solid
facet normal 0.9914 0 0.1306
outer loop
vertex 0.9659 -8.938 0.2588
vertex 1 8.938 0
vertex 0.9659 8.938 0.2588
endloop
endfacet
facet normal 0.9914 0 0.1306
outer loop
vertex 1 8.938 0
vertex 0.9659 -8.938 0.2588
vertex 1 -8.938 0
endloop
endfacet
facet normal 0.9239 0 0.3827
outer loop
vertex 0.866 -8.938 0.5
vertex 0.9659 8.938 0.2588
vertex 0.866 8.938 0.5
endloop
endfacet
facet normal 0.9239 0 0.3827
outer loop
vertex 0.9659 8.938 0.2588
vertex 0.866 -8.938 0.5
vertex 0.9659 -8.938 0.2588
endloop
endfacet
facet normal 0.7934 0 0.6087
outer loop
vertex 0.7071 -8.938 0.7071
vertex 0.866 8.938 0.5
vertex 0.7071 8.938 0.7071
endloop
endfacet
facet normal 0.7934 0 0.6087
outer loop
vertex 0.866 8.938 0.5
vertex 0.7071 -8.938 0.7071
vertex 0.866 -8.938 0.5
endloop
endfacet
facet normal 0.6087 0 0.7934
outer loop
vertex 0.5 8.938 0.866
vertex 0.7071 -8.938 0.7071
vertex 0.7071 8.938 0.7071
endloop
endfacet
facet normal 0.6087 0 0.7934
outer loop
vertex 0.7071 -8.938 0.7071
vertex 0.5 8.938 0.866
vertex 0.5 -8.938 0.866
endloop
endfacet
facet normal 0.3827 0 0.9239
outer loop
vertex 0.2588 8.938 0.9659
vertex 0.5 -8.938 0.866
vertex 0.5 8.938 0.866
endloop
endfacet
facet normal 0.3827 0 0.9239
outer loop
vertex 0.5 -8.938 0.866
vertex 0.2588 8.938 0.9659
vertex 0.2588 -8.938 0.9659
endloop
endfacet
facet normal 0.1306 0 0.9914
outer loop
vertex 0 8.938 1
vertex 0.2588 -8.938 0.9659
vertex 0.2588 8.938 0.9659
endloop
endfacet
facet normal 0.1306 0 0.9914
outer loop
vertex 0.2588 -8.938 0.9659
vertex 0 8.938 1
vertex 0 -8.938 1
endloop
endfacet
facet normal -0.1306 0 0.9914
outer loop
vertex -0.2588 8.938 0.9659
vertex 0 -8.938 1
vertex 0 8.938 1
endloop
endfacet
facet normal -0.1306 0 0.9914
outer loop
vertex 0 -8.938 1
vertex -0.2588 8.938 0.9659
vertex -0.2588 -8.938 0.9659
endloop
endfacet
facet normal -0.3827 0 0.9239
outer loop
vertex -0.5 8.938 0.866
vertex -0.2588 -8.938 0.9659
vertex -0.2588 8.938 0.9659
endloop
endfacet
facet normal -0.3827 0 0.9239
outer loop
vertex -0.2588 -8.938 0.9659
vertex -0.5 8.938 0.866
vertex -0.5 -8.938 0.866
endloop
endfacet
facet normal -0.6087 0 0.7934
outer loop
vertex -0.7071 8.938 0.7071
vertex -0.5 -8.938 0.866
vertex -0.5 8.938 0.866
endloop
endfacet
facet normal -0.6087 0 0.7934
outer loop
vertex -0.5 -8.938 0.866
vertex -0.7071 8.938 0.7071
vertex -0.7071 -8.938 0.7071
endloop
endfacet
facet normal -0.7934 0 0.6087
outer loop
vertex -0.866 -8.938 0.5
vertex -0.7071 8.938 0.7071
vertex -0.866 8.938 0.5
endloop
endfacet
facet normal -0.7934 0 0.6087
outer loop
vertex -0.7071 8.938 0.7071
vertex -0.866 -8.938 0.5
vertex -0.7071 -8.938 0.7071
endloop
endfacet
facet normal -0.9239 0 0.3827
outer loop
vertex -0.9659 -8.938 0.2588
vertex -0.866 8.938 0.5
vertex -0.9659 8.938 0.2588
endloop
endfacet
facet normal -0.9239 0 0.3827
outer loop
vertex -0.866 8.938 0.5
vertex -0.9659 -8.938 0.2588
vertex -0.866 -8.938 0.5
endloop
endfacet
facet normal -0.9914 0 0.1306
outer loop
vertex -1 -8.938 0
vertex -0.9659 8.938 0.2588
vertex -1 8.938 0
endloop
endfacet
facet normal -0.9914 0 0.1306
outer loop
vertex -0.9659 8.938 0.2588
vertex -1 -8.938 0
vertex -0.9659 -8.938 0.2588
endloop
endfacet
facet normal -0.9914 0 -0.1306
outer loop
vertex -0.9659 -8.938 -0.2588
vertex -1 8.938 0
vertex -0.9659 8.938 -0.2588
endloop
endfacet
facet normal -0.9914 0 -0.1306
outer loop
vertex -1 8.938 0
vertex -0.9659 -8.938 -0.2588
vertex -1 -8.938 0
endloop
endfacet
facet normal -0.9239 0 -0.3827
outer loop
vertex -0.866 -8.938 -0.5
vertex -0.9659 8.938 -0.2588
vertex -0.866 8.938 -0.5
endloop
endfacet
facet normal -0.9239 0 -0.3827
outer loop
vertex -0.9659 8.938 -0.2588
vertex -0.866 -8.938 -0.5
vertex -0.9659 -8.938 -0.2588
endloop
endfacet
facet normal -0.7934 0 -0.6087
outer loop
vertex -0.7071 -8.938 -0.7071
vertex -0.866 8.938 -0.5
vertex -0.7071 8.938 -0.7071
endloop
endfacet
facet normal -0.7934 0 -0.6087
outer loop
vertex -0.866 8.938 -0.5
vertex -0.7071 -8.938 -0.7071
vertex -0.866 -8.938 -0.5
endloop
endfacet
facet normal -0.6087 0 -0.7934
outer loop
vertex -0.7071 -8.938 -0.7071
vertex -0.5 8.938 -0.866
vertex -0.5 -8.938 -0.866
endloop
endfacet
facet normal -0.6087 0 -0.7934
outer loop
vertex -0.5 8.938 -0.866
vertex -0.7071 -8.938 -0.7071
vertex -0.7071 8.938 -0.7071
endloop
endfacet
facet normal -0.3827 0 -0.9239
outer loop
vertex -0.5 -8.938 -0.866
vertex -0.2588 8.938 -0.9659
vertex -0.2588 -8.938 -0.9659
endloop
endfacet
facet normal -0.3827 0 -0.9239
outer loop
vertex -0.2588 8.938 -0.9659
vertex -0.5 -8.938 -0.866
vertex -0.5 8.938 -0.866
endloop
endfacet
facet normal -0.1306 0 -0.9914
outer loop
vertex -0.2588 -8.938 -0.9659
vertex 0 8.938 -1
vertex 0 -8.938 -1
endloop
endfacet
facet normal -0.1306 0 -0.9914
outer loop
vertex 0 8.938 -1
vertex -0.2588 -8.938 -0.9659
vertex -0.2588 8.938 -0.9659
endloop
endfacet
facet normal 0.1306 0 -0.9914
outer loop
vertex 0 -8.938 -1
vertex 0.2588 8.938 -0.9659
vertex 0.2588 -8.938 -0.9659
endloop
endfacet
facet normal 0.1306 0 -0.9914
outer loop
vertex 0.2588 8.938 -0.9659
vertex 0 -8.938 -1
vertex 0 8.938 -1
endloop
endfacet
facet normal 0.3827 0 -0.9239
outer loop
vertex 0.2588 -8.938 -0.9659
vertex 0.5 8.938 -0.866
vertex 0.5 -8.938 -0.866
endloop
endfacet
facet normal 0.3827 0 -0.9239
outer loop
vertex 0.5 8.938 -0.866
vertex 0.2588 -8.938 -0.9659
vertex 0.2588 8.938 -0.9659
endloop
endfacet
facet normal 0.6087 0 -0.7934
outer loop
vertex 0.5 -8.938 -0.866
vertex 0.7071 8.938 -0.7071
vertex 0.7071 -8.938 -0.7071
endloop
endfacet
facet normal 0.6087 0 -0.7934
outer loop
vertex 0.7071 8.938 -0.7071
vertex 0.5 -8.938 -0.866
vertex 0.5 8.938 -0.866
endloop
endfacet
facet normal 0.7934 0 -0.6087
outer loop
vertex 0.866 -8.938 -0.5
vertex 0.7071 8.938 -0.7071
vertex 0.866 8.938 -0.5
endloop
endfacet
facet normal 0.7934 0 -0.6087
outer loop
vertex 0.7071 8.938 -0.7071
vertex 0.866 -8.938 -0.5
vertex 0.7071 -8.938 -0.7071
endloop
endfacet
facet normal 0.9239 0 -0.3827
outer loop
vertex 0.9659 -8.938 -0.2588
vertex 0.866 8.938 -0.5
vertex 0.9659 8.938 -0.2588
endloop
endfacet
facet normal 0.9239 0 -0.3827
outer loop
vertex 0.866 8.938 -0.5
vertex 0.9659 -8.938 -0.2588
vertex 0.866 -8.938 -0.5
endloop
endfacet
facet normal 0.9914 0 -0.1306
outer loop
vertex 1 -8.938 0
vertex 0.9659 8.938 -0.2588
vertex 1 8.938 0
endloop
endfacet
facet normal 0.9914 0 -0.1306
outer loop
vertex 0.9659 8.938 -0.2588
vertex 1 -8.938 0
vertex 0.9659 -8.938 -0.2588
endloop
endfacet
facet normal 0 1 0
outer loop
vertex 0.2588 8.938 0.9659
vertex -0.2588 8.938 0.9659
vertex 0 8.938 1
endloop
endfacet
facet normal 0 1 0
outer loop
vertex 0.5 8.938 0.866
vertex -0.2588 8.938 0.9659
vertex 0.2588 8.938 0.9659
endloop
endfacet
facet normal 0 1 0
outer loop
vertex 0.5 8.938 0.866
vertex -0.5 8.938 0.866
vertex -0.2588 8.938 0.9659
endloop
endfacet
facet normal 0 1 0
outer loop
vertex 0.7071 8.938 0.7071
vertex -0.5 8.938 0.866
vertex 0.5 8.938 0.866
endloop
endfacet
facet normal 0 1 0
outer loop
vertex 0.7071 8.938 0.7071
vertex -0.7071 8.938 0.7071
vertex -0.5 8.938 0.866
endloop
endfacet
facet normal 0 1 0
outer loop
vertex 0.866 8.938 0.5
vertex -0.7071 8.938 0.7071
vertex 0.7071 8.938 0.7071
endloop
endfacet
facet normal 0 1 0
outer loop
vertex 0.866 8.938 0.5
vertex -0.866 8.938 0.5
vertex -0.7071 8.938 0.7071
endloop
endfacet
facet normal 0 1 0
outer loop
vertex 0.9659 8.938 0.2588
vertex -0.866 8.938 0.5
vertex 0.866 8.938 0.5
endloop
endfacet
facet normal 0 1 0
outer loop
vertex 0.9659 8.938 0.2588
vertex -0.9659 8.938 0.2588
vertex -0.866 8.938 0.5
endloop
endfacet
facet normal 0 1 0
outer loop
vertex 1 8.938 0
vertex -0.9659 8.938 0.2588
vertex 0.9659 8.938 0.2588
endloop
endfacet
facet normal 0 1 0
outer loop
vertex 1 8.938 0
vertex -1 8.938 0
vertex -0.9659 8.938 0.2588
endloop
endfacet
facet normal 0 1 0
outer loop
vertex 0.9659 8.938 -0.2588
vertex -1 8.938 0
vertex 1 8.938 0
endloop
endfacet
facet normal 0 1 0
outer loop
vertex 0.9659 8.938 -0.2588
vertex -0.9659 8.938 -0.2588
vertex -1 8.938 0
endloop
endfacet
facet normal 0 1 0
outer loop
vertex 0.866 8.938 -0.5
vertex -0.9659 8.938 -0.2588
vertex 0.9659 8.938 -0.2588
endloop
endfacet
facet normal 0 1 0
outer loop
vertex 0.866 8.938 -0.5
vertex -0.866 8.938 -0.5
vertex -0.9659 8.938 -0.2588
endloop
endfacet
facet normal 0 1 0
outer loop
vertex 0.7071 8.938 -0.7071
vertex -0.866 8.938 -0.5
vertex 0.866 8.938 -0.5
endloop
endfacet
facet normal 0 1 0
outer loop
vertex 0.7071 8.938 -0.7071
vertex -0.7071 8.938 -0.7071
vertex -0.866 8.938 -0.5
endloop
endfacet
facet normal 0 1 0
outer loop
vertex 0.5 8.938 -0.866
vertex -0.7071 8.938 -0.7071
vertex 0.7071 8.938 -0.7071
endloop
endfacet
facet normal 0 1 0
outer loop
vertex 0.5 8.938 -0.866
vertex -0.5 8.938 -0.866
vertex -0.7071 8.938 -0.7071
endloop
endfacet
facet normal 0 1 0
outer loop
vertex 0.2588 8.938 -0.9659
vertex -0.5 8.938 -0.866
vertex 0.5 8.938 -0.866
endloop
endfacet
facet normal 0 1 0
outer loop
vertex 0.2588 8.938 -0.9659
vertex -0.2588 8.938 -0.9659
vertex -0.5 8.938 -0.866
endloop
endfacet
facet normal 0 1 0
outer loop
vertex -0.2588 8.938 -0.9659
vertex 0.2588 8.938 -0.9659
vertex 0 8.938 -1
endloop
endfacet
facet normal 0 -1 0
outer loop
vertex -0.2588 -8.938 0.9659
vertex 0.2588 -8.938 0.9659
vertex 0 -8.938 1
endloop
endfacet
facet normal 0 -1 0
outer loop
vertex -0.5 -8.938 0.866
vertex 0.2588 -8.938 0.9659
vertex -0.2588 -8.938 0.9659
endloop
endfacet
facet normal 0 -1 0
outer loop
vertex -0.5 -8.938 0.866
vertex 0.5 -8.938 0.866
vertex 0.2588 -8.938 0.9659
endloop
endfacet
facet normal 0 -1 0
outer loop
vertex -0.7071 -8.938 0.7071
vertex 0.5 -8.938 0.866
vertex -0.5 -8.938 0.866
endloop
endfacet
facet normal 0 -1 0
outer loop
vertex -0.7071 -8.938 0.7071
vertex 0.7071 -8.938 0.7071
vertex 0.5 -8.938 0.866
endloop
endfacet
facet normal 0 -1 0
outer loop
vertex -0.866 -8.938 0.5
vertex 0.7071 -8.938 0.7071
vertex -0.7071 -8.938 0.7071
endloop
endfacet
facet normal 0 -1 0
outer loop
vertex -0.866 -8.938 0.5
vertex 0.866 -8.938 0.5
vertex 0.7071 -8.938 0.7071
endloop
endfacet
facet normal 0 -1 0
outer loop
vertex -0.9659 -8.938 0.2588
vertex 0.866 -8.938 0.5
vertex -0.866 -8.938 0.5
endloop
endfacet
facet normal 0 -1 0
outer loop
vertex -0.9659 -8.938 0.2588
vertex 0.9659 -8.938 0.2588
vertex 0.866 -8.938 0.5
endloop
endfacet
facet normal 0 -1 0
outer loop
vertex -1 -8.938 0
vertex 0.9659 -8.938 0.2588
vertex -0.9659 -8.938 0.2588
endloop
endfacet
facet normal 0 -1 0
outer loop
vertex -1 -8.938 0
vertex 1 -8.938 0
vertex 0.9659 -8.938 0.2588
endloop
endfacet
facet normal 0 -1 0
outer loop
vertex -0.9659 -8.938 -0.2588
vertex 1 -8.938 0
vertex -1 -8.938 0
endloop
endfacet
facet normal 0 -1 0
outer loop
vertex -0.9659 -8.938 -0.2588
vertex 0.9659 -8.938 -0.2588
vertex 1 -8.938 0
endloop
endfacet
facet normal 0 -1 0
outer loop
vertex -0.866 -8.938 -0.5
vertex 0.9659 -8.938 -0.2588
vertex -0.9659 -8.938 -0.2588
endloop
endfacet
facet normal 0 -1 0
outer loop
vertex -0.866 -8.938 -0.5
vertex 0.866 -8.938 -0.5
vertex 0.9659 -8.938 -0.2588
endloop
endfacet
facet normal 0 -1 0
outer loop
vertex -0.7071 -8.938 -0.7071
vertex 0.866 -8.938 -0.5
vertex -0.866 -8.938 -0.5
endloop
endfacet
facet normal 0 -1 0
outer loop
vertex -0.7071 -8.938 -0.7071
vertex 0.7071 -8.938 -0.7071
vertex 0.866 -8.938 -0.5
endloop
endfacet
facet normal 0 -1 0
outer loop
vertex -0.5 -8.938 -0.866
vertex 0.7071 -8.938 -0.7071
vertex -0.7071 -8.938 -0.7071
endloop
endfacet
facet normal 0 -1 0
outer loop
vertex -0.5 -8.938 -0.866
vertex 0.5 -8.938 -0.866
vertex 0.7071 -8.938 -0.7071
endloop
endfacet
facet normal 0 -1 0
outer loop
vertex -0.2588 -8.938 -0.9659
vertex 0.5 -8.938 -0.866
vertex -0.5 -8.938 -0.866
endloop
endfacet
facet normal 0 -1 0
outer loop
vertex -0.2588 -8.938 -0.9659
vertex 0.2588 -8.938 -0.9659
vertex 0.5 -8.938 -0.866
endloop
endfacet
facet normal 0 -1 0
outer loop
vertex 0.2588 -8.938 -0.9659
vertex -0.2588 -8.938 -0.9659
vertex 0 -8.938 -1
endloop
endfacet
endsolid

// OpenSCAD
// file: layout.scad
// Rack layout geometry. Include config.scad once before this file.
// Functions are ordered so each name is defined before use (OpenSCAD 2021).

function rack_center_x() = 0;
function rack_center_y() = 0;

function x_divider_center_x(i) =
  rack_center_x() + divider_offset_from_center_in[i];

function divider_inner_left_x() =
  x_divider_center_x(0) + wall_thickness_in / 2;
function divider_inner_right_x() =
  x_divider_center_x(num_rows) - wall_thickness_in / 2;

function end_wall_inner_front_y() =
  rack_center_y() + end_wall_inner_offset_from_center_y[0];
function end_wall_inner_back_y() =
  rack_center_y() + end_wall_inner_offset_from_center_y[1];

function footprint_d_in() = max(
  end_wall_inner_back_y() - end_wall_inner_front_y(),
  (tubes_per_row - 1) * row_depth_in + tube_od_in
);

function layout_half_span_in() =
  max(
    max([for (i = [0 : num_rows - 1]) abs(column_tube_offset_from_center_in[i])])
      + tube_od_in / 2,
    max([for (i = [0 : num_rows]) abs(divider_offset_from_center_in[i])])
      + wall_thickness_in / 2
  );

function end_wall_w_in() =
  x_divider_center_x(num_rows) - x_divider_center_x(0) + wall_thickness_in
    + 2 * end_wall_extension_in;
function end_wall_x0() =
  x_divider_center_x(0) - wall_thickness_in / 2 - end_wall_extension_in;
function end_wall_height_in() = wall_height_in;

function tube_center_y(col_i) =
  rack_center_y() + depth_tube_offset_from_center_in[col_i];

function column_board_length_in() = footprint_d_in() + column_board_extension_in;
function column_board_y0() =
  rack_center_y() - column_board_length_in() / 2;
function board_half_lap_z_in() = wall_height_in / 2;

function num_middle_row_dividers() = tubes_per_row - 1;

function middle_row_divider_center_y(i) =
  rack_center_y()
    + (depth_tube_offset_from_center_in[i]
      + depth_tube_offset_from_center_in[i + 1])
      / 2;

function middle_row_z0_in() = board_half_lap_z_in();
function middle_row_height_in() = wall_height_in;
function middle_row_half_lap_z_in() = middle_row_height_in() / 2;
// Lap in the column upper band (overlap with column is only wall_height - z0).
function column_middle_row_notch_z0() =
  middle_row_z0_in() + (wall_height_in - middle_row_z0_in()) / 2;
function column_middle_row_notch_h_in() =
  (wall_height_in - middle_row_z0_in()) / 2;
function row_board_middle_w_in() = end_wall_w_in();
function row_board_middle_x0() = end_wall_x0();

function footprint_w_in() = max(
  divider_inner_right_x() - divider_inner_left_x(),
  2 * (layout_half_span_in() + tilt_pad_x_in)
);

function bay_center_x(row_i) =
  rack_center_x() + column_tube_offset_from_center_in[row_i];

function divider_clear_span_x(bay_i) =
  divider_offset_from_center_in[bay_i + 1]
    - divider_offset_from_center_in[bay_i]
    - wall_thickness_in;

// --- Top dowels (middle + inner primitives; rack.scad places num_row_dowels_top copies) ---
function dowel_layer_z0_in() =
  middle_row_z0_in() + middle_row_height_in() + dowel_above_middle_row_in;

function row_dowel_length_y_in() = column_board_length_in();

function row_dowel_od_at(i) = row_dowel_od_in[i];

function row_dowel_center_z_in(i) = dowel_layer_z0_in() + row_dowel_od_at(i) / 2;

function row_dowel_placement_x(i) =
  rack_center_x() + row_dowel_x_offset_from_center_in[i];

function row_dowel_tube_column(i) = row_dowel_tube_column_i[i];
// file: config.scad
// Finale mortar rack — shared parameters (inches unless noted)

// --- Tubes (inventory) ---
tube_od_in = 2.375;
tube_length_in = 12;
shell_nominal_in = 2; // Class C 2 in. mortars

// --- Layout ---
num_rows = 5;
tubes_per_row = 5; // 5×5 per rack × 2 racks = 50 tubes (Commander finale)
num_dividers_x = num_rows + 1; // 6 green boards: left side + 4 between columns + right side
board_thickness_in = 0.5;
tube_gap_in = 0.25; // extra clearance inside each cell
row_spacing_in = tube_od_in + board_thickness_in + tube_gap_in;
row_depth_in = tube_od_in + board_thickness_in + tube_gap_in;

// --- Column layout (+X = right, from rack center) ---
column_tube_offset_from_center_in = [
  -6.5, // 0 outer left
  -3, // 1 middle left
  0,      // 2 center
  3,  // 3 middle right
  6.5,  // 4 outer right
];
divider_offset_from_center_in = [
  -9,     // 0 left side (outer)
  -5,     // 1 outer left | middle left
  -1.5,   // 2 middle left | center
  1.5,    // 3 center | middle right
  5,      // 4 middle right | outer right
  9,      // 5 right side (outer)
];

// --- Depth layout (+Y = toward back, from rack center) ---
depth_tube_offset_from_center_in = [
  -6.25, // 0 front
  -3.125,
  0,     // 2 center
  3.125,
  6.25,  // 4 back
];
end_wall_inner_offset_from_center_y = [
  -7.438, // front inner face
  7.438,  // back inner face
];

column_board_extension_in = 3; // +length along Y total (1-1/2 in. each end), centered on rack Y
end_wall_extension_in = 1; // brown ends: +1 in. per side in X (panel plane)
column_end_half_lap = true; // half-lap: columns lose bottom half, rows lose top half
middle_row_half_lap = true; // mid-height row dividers: bottom half out; columns lose top of upper half

// --- Top dowels (four cylinders along +Y, centered on rack Y) ---
num_row_dowels_top = 4;
row_dowel_x_offset_from_center_in = [
  -6,     // 0 inside outer-left column (bay 0)
  -2,  // 1 outside middle column, left (bay 1)
  2,   // 2 outside middle column, right (bay 3)
  6,      // 3 inside outer-right column (bay 4)
];
row_dowel_bay_i = [0, 1, 3, 4]; // green-column bay per dowel (for OD)
row_dowel_tube_column_i = [0, 1, 3, 4]; // tubes to subtract per dowel
dowel_above_middle_row_in = 1; // bottom of dowel sits this far above row-board-middle top
row_dowel_od_middle_in = 2;   // ±6 in. X (bay 0 / 4)
row_dowel_od_inner_in = 1.5;  // ±2 in. X (bay 1 / 3)
row_dowel_middle_i = [0, 3];
row_dowel_inner_i = [1, 2];
// OD per dowel index: [middle-L, inner-L, inner-R, middle-R]
row_dowel_od_in = [
  row_dowel_od_middle_in,
  row_dowel_od_inner_in,
  row_dowel_od_inner_in,
  row_dowel_od_middle_in,
];
dowel_fit_clearance_in = 0.125; // used when auto-sizing OD from bay span
center_tube_column_i = 2; // middle tube column (0..num_rows-1)

// --- Angles (degrees from vertical; left negative, right positive) ---
outer_angle_deg = 12;

function row_offset(i) = i - floor(num_rows / 2); // -2 .. +2 for 5 rows
function sign(x) = x < 0 ? -1 : (x > 0 ? 1 : 0);
function row_angle_deg(i) =
  let (o = row_offset(i))
  o == 0 ? 0 : sign(o) * outer_angle_deg * abs(o) / 2;

tilt_pad_x_in = tube_length_in * sin(outer_angle_deg) + tube_gap_in;

// --- Structure (1/2 in. plywood walls only) ---
wall_thickness_in = 0.5;
wall_height_in = 3.5; // row boards + column boards (same height)

color_wall_end = [0.90, 0.62, 0.38];
color_wall_side = [0.58, 0.72, 0.42];
color_middle_row = [0.45, 0.55, 0.85];
color_dowel_middle = [0.85, 0.75, 0.35];
color_dowel_standard = [0.75, 0.55, 0.25];
color_tube = [0.25, 0.45, 0.85, 0.85];

// --- Preview ---
preview = true;
$fn = preview ? 24 : 72;
show_tubes = true;
show_walls = true; // brown front/back ends
show_x_column_boards = true; // six green dividers along +X
show_middle_row_boards = true; // four mid-height row dividers (between tube rows along Y)
show_row_dowels_top = true; // dowels along Y between column boards
// main file
// Middle top dowel (±6 in. X): cylinder along +Y, origin at geometric center.
// rack.scad places row_dowel_middle_i instances.
include <config.scad>
include <layout.scad>

module row_dowel_top_middle_cylinder() {
  color(color_dowel_middle)
    rotate([90, 0, 0])
      cylinder(h = row_dowel_length_y_in(), d = row_dowel_od_middle_in, center = true);
}

if (is_undef(FINALE_RACK_ASSEMBLY))
  row_dowel_top_middle_cylinder();
